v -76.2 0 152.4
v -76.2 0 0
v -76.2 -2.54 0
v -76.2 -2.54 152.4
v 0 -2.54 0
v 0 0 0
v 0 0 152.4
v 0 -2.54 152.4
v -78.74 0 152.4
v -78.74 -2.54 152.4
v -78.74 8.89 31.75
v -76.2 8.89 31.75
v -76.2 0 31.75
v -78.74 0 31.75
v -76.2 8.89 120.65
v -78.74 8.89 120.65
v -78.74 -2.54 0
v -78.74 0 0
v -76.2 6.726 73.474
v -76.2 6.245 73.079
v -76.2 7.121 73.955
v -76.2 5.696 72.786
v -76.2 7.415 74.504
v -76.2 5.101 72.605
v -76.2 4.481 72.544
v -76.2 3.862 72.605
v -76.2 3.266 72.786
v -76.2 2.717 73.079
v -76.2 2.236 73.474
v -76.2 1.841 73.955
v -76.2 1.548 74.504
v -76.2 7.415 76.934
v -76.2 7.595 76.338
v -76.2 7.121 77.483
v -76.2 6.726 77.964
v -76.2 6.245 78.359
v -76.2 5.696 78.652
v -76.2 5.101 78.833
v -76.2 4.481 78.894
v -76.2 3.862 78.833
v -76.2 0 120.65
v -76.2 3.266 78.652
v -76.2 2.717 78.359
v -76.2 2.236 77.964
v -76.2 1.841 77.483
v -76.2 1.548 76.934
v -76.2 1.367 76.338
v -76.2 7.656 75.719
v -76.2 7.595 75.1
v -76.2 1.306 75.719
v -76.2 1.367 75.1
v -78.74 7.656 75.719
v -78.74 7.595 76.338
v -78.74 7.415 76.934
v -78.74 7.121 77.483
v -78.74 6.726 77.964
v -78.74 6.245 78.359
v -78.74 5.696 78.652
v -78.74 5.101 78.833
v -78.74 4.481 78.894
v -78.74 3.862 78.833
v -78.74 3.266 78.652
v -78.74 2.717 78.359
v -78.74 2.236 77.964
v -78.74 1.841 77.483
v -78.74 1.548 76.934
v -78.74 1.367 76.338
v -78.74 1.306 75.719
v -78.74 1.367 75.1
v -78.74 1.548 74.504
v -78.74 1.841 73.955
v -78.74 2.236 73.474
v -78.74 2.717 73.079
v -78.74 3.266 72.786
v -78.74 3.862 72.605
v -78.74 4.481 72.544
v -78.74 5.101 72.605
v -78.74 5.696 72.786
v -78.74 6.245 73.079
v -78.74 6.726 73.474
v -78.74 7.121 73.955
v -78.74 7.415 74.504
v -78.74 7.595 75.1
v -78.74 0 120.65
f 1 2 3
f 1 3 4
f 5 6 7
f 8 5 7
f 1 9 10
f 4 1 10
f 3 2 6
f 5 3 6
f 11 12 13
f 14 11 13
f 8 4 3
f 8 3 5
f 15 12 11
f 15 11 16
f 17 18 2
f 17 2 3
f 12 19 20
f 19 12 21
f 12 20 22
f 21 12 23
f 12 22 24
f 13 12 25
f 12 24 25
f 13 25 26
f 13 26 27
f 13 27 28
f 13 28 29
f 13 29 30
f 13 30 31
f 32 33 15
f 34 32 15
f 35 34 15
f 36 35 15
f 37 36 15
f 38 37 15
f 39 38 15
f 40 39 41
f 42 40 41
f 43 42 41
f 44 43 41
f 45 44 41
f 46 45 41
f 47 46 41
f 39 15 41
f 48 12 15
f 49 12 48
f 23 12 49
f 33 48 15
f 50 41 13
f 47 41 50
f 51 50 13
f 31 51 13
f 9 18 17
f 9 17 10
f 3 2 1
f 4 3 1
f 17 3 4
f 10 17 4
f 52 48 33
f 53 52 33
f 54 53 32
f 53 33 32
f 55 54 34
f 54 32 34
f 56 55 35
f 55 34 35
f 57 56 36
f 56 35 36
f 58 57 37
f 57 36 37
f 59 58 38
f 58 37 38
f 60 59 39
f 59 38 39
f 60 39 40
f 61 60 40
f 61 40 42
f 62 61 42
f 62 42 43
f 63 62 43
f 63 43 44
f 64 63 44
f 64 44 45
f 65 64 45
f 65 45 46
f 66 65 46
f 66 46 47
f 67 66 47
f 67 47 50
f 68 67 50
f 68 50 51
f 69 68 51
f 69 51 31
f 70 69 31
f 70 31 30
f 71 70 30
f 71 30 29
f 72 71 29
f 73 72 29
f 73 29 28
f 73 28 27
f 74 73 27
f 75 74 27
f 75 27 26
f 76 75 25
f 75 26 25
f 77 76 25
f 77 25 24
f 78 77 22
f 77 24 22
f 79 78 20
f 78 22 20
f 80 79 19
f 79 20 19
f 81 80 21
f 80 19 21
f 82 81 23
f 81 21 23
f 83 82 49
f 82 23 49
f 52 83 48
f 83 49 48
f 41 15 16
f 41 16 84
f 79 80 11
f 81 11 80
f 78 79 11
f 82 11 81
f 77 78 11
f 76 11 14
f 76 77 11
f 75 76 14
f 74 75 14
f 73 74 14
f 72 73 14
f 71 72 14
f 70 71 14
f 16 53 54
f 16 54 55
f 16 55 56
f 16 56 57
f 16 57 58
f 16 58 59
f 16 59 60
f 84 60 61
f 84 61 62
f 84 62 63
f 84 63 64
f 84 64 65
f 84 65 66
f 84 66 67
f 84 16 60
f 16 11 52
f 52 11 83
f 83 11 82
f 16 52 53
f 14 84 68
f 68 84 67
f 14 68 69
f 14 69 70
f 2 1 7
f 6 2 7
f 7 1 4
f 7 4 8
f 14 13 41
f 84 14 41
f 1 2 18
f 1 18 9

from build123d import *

# Parameters (mm, degrees)
F0_W     = 76.2
F0_H     = 152.4
F1_DEPTH = 2.54
F2_W     = 8.89
F2_H     = 88.9
F3_DEPTH = 2.54
F4_DEPTH = 2.54
F6_D     = 6.35


with BuildPart() as f1:
    # F0 (on Front) → F1 (new body)
    with BuildSketch(Plane.XZ):
        with Locations((-38.1, 76.2)):
            Rectangle(F0_W, F0_H)
    extrude(amount=F1_DEPTH)


with BuildPart() as f3:
    # F2 (on face) → F3 (new body)
    with BuildSketch(Plane(origin=(-76.2, 0, 0), x_dir=(0, -1, 0), z_dir=(-1, 0, 0))):
        with Locations((-4.445, 76.2)):
            Rectangle(F2_W, F2_H)
    extrude(amount=F3_DEPTH)

    # F6 (through all)
    with Locations(Plane(origin=(-78.74, 0, 0), x_dir=(0, -1, 0), z_dir=(-1, 0, 0))):
        with Locations((-4.4812513515, 75.7189393044)):
            Hole(F6_D / 2)


with BuildPart() as f4:
    # F4 (new): a face of the model
    f4_faces = [f1.part.faces().sort_by_distance(p)[0] for p in [
        (-76.2, -1.27, 76.2),
    ]]
    extrude(f4_faces, amount=F4_DEPTH)


solid = Compound([f1.part, f3.part, f4.part])
